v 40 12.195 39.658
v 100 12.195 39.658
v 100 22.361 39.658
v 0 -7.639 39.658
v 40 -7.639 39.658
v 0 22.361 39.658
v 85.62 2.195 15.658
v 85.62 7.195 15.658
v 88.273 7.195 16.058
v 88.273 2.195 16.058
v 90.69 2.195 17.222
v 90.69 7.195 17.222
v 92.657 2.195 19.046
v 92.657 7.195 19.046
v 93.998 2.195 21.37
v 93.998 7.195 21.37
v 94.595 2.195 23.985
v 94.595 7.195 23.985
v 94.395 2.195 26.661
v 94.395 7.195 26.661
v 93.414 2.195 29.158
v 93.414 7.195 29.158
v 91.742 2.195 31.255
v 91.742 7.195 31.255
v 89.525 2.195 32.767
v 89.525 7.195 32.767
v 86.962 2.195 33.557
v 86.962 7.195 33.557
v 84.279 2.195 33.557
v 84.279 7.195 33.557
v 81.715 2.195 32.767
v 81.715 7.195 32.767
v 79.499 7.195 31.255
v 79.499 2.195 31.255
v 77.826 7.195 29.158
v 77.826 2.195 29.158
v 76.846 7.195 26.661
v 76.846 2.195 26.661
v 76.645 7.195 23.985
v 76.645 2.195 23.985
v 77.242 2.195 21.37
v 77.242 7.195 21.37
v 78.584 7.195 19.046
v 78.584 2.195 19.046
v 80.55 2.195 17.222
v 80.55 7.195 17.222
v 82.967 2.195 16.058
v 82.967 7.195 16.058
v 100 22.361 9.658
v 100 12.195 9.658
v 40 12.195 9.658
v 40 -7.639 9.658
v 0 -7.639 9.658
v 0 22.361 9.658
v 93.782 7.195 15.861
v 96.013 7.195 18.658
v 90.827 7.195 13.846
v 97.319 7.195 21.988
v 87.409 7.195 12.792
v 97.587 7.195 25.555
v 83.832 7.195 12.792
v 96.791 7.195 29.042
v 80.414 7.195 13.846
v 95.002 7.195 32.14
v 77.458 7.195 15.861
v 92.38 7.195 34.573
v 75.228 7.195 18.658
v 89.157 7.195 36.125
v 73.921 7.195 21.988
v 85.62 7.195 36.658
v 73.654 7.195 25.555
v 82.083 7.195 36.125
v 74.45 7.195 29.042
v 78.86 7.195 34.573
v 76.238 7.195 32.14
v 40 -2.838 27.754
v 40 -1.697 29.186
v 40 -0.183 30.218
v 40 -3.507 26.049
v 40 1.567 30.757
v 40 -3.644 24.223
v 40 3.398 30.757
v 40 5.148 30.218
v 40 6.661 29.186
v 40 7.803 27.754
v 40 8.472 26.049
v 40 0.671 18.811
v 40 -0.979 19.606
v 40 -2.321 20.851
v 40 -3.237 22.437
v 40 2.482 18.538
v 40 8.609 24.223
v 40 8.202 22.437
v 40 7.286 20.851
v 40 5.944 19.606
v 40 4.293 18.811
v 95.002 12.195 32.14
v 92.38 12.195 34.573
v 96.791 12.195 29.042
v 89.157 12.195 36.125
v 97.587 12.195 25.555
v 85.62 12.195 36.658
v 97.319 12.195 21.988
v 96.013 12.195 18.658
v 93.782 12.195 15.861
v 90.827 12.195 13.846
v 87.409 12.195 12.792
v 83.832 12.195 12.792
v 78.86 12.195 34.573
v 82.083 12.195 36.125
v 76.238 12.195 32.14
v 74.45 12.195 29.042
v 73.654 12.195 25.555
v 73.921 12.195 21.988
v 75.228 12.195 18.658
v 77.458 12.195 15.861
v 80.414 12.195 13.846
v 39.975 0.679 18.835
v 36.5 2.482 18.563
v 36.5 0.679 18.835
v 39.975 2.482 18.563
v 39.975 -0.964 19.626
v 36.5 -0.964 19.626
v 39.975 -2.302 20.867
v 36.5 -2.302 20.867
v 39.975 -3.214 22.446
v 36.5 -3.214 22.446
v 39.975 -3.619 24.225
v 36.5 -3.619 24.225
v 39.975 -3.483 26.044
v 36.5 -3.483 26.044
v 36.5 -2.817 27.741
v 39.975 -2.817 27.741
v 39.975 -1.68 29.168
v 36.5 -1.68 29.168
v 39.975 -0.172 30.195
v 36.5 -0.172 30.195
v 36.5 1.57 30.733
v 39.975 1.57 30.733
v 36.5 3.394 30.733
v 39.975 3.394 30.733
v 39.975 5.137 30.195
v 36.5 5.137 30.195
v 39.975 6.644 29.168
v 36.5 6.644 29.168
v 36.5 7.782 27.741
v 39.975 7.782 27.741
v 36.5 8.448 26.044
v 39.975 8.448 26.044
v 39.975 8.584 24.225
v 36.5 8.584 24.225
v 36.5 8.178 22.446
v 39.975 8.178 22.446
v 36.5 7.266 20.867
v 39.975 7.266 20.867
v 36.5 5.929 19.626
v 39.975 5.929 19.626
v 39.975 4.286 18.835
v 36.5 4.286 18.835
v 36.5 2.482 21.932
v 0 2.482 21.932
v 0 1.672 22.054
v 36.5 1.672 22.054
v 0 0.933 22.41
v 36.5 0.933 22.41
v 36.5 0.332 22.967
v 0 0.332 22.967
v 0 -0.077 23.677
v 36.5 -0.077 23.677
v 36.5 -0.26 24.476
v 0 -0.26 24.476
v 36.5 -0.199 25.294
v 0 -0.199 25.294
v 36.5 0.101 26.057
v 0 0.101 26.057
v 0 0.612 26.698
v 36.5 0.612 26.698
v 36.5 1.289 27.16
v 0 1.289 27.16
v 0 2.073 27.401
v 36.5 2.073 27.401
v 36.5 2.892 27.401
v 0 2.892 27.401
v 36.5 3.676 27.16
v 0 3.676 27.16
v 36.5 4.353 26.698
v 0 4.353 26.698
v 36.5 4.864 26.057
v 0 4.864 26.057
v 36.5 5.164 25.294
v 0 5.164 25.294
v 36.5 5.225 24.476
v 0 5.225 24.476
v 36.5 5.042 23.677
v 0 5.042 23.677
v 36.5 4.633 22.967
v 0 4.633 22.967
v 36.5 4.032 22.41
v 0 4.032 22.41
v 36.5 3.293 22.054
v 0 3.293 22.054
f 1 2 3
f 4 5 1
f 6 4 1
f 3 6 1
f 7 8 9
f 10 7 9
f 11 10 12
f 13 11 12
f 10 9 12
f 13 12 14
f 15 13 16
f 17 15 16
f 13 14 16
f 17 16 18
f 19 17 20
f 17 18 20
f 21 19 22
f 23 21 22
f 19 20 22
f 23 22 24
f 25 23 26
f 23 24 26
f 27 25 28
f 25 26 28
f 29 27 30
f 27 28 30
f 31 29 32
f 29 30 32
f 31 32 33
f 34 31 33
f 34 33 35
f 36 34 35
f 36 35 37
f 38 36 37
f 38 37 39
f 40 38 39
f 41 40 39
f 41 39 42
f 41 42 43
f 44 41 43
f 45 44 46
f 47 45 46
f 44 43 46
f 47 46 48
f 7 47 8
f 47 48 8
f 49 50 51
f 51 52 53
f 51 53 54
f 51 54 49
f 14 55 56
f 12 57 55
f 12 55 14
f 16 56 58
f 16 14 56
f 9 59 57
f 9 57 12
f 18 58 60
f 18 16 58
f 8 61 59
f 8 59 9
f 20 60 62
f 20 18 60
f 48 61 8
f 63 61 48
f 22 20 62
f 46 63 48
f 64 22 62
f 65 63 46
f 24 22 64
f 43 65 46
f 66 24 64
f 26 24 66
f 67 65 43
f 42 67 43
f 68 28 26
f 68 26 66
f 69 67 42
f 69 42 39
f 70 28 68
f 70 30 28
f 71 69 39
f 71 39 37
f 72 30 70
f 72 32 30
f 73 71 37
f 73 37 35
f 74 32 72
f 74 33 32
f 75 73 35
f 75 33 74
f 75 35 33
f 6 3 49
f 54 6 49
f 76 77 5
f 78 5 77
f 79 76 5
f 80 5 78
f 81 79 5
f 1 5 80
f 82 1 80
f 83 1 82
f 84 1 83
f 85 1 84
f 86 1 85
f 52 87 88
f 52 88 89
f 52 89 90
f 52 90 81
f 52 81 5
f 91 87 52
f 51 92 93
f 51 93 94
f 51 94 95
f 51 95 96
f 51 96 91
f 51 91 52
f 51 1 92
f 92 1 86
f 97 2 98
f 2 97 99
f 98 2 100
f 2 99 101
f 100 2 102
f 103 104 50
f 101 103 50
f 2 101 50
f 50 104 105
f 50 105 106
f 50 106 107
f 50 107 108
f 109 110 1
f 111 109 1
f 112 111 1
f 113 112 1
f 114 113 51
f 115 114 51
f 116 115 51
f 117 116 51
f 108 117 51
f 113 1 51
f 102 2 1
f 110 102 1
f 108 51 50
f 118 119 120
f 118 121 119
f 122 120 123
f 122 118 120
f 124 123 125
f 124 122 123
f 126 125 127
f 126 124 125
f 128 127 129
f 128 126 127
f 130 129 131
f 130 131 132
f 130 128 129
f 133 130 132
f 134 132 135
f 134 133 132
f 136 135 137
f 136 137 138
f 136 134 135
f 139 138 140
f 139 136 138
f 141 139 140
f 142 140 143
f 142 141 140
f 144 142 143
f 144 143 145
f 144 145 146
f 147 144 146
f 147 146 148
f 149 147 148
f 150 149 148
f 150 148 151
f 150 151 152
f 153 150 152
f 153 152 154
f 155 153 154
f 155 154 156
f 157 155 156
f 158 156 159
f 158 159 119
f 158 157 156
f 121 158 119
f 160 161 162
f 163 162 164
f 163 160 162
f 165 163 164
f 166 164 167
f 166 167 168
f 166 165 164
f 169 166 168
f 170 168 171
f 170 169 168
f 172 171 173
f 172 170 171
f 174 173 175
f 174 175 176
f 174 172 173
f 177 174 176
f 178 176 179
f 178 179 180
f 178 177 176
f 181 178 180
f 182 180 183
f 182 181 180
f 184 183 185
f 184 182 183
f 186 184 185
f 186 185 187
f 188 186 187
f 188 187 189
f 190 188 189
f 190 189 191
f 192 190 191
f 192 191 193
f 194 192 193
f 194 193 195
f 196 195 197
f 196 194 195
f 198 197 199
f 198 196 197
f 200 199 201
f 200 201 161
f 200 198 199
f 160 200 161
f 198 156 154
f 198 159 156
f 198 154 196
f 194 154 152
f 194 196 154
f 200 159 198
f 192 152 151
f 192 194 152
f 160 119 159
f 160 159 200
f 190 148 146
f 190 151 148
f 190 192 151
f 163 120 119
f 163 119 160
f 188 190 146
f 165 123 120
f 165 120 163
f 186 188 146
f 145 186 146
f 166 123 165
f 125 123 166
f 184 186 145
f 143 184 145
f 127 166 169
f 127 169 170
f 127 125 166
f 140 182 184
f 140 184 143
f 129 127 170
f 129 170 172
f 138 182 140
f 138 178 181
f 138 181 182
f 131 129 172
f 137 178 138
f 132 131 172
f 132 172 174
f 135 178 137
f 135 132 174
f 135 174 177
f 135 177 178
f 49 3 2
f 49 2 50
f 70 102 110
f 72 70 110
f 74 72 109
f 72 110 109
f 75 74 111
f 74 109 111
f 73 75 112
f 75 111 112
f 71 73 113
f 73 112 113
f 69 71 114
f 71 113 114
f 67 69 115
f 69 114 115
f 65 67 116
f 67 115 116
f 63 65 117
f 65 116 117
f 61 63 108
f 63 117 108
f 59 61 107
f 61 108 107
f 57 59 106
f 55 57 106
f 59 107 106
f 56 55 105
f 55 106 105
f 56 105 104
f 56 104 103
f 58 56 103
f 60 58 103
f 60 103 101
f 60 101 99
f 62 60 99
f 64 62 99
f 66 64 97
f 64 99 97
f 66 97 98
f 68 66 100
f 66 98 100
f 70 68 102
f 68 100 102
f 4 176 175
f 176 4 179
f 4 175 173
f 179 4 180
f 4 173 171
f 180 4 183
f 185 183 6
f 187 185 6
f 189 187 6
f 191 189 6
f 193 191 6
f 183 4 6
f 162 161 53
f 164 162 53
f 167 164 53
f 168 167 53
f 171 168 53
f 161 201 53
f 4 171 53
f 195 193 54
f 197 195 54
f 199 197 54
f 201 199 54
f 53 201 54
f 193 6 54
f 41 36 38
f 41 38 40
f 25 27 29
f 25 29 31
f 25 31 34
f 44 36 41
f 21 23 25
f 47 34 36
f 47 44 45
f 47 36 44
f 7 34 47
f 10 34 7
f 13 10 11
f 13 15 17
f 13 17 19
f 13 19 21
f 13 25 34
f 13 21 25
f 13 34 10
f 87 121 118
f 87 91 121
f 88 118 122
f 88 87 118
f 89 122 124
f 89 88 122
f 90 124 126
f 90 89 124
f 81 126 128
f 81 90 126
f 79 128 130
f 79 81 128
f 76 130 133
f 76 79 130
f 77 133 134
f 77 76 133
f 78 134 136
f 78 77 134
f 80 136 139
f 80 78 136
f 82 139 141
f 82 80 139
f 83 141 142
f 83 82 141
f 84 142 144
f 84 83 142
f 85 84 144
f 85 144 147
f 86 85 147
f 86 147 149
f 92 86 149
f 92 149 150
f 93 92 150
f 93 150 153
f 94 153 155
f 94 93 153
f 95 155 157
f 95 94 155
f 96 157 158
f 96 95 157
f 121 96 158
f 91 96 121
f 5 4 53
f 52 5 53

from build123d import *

# Parameters (mm, degrees)
SKETCH_1_W      = 30
SKETCH_1_H      = 30
EXTRUDE_1_DEPTH = 40
SKETCH_2_W      = 30
SKETCH_2_H      = 10.165772452
EXTRUDE_2_DEPTH = 60
SKETCH_3_R      = 12
EXTRUDE_3_DEPTH = 5
SKETCH_4_R      = 9
EXTRUDE_4_DEPTH = 5


with BuildPart() as part:
    # Эскиз1 → Бобышка-Вытянуть1 (new body)
    with BuildSketch(Plane(origin=(0, 0, 0), x_dir=(0, 0, -1), z_dir=(1, 0, 0))):
        with Locations((-24.657846844, 7.360988518)):
            Rectangle(SKETCH_1_W, SKETCH_1_H)
    extrude(amount=EXTRUDE_1_DEPTH)

    # Эскиз2 → Бобышка-Вытянуть2 (add)
    with BuildSketch(Plane(origin=(40, 0, 0), x_dir=(0, 0, -1), z_dir=(1, 0, 0))):
        with Locations((-24.657846844, 17.278102292)):
            Rectangle(SKETCH_2_W, SKETCH_2_H)
    extrude(amount=EXTRUDE_2_DEPTH)

    # Эскиз3 → Бобышка-Вытянуть3 (add)
    with BuildSketch(Plane.XZ.offset(-12.195216066)):
        with Locations(Location((85.620234383, 24.657846844, 0), (0, 0, 90))):
            Circle(SKETCH_3_R)
    extrude(amount=EXTRUDE_3_DEPTH)

    # Эскиз4 → Бобышка-Вытянуть4 (add)
    with BuildSketch(Plane.XZ.offset(-7.195216066)):
        with Locations(Location((85.620234383, 24.657846844, 0), (0, 0, 270))):
            Circle(SKETCH_4_R)
    extrude(amount=EXTRUDE_4_DEPTH)

    # Эскиз13 → Цековка для  болта с шестигранной головкой M51 (revolve, cut)
    with BuildSketch(Plane(origin=(40, 2.482471753, 24.681970174), x_dir=(0, 0, -1), z_dir=(0, 1, 0))):
        Polygon((0, 0), (0, 40), (2.75, 40), (2.75, 3.5), (6.119, 3.5), (6.119, 0.025), (6.144, 0), align=None)
    revolve(axis=Axis((46.35, 2.482471753, 24.681970174), (-1, 0, 0)), mode=Mode.SUBTRACT)


solid = part.part
